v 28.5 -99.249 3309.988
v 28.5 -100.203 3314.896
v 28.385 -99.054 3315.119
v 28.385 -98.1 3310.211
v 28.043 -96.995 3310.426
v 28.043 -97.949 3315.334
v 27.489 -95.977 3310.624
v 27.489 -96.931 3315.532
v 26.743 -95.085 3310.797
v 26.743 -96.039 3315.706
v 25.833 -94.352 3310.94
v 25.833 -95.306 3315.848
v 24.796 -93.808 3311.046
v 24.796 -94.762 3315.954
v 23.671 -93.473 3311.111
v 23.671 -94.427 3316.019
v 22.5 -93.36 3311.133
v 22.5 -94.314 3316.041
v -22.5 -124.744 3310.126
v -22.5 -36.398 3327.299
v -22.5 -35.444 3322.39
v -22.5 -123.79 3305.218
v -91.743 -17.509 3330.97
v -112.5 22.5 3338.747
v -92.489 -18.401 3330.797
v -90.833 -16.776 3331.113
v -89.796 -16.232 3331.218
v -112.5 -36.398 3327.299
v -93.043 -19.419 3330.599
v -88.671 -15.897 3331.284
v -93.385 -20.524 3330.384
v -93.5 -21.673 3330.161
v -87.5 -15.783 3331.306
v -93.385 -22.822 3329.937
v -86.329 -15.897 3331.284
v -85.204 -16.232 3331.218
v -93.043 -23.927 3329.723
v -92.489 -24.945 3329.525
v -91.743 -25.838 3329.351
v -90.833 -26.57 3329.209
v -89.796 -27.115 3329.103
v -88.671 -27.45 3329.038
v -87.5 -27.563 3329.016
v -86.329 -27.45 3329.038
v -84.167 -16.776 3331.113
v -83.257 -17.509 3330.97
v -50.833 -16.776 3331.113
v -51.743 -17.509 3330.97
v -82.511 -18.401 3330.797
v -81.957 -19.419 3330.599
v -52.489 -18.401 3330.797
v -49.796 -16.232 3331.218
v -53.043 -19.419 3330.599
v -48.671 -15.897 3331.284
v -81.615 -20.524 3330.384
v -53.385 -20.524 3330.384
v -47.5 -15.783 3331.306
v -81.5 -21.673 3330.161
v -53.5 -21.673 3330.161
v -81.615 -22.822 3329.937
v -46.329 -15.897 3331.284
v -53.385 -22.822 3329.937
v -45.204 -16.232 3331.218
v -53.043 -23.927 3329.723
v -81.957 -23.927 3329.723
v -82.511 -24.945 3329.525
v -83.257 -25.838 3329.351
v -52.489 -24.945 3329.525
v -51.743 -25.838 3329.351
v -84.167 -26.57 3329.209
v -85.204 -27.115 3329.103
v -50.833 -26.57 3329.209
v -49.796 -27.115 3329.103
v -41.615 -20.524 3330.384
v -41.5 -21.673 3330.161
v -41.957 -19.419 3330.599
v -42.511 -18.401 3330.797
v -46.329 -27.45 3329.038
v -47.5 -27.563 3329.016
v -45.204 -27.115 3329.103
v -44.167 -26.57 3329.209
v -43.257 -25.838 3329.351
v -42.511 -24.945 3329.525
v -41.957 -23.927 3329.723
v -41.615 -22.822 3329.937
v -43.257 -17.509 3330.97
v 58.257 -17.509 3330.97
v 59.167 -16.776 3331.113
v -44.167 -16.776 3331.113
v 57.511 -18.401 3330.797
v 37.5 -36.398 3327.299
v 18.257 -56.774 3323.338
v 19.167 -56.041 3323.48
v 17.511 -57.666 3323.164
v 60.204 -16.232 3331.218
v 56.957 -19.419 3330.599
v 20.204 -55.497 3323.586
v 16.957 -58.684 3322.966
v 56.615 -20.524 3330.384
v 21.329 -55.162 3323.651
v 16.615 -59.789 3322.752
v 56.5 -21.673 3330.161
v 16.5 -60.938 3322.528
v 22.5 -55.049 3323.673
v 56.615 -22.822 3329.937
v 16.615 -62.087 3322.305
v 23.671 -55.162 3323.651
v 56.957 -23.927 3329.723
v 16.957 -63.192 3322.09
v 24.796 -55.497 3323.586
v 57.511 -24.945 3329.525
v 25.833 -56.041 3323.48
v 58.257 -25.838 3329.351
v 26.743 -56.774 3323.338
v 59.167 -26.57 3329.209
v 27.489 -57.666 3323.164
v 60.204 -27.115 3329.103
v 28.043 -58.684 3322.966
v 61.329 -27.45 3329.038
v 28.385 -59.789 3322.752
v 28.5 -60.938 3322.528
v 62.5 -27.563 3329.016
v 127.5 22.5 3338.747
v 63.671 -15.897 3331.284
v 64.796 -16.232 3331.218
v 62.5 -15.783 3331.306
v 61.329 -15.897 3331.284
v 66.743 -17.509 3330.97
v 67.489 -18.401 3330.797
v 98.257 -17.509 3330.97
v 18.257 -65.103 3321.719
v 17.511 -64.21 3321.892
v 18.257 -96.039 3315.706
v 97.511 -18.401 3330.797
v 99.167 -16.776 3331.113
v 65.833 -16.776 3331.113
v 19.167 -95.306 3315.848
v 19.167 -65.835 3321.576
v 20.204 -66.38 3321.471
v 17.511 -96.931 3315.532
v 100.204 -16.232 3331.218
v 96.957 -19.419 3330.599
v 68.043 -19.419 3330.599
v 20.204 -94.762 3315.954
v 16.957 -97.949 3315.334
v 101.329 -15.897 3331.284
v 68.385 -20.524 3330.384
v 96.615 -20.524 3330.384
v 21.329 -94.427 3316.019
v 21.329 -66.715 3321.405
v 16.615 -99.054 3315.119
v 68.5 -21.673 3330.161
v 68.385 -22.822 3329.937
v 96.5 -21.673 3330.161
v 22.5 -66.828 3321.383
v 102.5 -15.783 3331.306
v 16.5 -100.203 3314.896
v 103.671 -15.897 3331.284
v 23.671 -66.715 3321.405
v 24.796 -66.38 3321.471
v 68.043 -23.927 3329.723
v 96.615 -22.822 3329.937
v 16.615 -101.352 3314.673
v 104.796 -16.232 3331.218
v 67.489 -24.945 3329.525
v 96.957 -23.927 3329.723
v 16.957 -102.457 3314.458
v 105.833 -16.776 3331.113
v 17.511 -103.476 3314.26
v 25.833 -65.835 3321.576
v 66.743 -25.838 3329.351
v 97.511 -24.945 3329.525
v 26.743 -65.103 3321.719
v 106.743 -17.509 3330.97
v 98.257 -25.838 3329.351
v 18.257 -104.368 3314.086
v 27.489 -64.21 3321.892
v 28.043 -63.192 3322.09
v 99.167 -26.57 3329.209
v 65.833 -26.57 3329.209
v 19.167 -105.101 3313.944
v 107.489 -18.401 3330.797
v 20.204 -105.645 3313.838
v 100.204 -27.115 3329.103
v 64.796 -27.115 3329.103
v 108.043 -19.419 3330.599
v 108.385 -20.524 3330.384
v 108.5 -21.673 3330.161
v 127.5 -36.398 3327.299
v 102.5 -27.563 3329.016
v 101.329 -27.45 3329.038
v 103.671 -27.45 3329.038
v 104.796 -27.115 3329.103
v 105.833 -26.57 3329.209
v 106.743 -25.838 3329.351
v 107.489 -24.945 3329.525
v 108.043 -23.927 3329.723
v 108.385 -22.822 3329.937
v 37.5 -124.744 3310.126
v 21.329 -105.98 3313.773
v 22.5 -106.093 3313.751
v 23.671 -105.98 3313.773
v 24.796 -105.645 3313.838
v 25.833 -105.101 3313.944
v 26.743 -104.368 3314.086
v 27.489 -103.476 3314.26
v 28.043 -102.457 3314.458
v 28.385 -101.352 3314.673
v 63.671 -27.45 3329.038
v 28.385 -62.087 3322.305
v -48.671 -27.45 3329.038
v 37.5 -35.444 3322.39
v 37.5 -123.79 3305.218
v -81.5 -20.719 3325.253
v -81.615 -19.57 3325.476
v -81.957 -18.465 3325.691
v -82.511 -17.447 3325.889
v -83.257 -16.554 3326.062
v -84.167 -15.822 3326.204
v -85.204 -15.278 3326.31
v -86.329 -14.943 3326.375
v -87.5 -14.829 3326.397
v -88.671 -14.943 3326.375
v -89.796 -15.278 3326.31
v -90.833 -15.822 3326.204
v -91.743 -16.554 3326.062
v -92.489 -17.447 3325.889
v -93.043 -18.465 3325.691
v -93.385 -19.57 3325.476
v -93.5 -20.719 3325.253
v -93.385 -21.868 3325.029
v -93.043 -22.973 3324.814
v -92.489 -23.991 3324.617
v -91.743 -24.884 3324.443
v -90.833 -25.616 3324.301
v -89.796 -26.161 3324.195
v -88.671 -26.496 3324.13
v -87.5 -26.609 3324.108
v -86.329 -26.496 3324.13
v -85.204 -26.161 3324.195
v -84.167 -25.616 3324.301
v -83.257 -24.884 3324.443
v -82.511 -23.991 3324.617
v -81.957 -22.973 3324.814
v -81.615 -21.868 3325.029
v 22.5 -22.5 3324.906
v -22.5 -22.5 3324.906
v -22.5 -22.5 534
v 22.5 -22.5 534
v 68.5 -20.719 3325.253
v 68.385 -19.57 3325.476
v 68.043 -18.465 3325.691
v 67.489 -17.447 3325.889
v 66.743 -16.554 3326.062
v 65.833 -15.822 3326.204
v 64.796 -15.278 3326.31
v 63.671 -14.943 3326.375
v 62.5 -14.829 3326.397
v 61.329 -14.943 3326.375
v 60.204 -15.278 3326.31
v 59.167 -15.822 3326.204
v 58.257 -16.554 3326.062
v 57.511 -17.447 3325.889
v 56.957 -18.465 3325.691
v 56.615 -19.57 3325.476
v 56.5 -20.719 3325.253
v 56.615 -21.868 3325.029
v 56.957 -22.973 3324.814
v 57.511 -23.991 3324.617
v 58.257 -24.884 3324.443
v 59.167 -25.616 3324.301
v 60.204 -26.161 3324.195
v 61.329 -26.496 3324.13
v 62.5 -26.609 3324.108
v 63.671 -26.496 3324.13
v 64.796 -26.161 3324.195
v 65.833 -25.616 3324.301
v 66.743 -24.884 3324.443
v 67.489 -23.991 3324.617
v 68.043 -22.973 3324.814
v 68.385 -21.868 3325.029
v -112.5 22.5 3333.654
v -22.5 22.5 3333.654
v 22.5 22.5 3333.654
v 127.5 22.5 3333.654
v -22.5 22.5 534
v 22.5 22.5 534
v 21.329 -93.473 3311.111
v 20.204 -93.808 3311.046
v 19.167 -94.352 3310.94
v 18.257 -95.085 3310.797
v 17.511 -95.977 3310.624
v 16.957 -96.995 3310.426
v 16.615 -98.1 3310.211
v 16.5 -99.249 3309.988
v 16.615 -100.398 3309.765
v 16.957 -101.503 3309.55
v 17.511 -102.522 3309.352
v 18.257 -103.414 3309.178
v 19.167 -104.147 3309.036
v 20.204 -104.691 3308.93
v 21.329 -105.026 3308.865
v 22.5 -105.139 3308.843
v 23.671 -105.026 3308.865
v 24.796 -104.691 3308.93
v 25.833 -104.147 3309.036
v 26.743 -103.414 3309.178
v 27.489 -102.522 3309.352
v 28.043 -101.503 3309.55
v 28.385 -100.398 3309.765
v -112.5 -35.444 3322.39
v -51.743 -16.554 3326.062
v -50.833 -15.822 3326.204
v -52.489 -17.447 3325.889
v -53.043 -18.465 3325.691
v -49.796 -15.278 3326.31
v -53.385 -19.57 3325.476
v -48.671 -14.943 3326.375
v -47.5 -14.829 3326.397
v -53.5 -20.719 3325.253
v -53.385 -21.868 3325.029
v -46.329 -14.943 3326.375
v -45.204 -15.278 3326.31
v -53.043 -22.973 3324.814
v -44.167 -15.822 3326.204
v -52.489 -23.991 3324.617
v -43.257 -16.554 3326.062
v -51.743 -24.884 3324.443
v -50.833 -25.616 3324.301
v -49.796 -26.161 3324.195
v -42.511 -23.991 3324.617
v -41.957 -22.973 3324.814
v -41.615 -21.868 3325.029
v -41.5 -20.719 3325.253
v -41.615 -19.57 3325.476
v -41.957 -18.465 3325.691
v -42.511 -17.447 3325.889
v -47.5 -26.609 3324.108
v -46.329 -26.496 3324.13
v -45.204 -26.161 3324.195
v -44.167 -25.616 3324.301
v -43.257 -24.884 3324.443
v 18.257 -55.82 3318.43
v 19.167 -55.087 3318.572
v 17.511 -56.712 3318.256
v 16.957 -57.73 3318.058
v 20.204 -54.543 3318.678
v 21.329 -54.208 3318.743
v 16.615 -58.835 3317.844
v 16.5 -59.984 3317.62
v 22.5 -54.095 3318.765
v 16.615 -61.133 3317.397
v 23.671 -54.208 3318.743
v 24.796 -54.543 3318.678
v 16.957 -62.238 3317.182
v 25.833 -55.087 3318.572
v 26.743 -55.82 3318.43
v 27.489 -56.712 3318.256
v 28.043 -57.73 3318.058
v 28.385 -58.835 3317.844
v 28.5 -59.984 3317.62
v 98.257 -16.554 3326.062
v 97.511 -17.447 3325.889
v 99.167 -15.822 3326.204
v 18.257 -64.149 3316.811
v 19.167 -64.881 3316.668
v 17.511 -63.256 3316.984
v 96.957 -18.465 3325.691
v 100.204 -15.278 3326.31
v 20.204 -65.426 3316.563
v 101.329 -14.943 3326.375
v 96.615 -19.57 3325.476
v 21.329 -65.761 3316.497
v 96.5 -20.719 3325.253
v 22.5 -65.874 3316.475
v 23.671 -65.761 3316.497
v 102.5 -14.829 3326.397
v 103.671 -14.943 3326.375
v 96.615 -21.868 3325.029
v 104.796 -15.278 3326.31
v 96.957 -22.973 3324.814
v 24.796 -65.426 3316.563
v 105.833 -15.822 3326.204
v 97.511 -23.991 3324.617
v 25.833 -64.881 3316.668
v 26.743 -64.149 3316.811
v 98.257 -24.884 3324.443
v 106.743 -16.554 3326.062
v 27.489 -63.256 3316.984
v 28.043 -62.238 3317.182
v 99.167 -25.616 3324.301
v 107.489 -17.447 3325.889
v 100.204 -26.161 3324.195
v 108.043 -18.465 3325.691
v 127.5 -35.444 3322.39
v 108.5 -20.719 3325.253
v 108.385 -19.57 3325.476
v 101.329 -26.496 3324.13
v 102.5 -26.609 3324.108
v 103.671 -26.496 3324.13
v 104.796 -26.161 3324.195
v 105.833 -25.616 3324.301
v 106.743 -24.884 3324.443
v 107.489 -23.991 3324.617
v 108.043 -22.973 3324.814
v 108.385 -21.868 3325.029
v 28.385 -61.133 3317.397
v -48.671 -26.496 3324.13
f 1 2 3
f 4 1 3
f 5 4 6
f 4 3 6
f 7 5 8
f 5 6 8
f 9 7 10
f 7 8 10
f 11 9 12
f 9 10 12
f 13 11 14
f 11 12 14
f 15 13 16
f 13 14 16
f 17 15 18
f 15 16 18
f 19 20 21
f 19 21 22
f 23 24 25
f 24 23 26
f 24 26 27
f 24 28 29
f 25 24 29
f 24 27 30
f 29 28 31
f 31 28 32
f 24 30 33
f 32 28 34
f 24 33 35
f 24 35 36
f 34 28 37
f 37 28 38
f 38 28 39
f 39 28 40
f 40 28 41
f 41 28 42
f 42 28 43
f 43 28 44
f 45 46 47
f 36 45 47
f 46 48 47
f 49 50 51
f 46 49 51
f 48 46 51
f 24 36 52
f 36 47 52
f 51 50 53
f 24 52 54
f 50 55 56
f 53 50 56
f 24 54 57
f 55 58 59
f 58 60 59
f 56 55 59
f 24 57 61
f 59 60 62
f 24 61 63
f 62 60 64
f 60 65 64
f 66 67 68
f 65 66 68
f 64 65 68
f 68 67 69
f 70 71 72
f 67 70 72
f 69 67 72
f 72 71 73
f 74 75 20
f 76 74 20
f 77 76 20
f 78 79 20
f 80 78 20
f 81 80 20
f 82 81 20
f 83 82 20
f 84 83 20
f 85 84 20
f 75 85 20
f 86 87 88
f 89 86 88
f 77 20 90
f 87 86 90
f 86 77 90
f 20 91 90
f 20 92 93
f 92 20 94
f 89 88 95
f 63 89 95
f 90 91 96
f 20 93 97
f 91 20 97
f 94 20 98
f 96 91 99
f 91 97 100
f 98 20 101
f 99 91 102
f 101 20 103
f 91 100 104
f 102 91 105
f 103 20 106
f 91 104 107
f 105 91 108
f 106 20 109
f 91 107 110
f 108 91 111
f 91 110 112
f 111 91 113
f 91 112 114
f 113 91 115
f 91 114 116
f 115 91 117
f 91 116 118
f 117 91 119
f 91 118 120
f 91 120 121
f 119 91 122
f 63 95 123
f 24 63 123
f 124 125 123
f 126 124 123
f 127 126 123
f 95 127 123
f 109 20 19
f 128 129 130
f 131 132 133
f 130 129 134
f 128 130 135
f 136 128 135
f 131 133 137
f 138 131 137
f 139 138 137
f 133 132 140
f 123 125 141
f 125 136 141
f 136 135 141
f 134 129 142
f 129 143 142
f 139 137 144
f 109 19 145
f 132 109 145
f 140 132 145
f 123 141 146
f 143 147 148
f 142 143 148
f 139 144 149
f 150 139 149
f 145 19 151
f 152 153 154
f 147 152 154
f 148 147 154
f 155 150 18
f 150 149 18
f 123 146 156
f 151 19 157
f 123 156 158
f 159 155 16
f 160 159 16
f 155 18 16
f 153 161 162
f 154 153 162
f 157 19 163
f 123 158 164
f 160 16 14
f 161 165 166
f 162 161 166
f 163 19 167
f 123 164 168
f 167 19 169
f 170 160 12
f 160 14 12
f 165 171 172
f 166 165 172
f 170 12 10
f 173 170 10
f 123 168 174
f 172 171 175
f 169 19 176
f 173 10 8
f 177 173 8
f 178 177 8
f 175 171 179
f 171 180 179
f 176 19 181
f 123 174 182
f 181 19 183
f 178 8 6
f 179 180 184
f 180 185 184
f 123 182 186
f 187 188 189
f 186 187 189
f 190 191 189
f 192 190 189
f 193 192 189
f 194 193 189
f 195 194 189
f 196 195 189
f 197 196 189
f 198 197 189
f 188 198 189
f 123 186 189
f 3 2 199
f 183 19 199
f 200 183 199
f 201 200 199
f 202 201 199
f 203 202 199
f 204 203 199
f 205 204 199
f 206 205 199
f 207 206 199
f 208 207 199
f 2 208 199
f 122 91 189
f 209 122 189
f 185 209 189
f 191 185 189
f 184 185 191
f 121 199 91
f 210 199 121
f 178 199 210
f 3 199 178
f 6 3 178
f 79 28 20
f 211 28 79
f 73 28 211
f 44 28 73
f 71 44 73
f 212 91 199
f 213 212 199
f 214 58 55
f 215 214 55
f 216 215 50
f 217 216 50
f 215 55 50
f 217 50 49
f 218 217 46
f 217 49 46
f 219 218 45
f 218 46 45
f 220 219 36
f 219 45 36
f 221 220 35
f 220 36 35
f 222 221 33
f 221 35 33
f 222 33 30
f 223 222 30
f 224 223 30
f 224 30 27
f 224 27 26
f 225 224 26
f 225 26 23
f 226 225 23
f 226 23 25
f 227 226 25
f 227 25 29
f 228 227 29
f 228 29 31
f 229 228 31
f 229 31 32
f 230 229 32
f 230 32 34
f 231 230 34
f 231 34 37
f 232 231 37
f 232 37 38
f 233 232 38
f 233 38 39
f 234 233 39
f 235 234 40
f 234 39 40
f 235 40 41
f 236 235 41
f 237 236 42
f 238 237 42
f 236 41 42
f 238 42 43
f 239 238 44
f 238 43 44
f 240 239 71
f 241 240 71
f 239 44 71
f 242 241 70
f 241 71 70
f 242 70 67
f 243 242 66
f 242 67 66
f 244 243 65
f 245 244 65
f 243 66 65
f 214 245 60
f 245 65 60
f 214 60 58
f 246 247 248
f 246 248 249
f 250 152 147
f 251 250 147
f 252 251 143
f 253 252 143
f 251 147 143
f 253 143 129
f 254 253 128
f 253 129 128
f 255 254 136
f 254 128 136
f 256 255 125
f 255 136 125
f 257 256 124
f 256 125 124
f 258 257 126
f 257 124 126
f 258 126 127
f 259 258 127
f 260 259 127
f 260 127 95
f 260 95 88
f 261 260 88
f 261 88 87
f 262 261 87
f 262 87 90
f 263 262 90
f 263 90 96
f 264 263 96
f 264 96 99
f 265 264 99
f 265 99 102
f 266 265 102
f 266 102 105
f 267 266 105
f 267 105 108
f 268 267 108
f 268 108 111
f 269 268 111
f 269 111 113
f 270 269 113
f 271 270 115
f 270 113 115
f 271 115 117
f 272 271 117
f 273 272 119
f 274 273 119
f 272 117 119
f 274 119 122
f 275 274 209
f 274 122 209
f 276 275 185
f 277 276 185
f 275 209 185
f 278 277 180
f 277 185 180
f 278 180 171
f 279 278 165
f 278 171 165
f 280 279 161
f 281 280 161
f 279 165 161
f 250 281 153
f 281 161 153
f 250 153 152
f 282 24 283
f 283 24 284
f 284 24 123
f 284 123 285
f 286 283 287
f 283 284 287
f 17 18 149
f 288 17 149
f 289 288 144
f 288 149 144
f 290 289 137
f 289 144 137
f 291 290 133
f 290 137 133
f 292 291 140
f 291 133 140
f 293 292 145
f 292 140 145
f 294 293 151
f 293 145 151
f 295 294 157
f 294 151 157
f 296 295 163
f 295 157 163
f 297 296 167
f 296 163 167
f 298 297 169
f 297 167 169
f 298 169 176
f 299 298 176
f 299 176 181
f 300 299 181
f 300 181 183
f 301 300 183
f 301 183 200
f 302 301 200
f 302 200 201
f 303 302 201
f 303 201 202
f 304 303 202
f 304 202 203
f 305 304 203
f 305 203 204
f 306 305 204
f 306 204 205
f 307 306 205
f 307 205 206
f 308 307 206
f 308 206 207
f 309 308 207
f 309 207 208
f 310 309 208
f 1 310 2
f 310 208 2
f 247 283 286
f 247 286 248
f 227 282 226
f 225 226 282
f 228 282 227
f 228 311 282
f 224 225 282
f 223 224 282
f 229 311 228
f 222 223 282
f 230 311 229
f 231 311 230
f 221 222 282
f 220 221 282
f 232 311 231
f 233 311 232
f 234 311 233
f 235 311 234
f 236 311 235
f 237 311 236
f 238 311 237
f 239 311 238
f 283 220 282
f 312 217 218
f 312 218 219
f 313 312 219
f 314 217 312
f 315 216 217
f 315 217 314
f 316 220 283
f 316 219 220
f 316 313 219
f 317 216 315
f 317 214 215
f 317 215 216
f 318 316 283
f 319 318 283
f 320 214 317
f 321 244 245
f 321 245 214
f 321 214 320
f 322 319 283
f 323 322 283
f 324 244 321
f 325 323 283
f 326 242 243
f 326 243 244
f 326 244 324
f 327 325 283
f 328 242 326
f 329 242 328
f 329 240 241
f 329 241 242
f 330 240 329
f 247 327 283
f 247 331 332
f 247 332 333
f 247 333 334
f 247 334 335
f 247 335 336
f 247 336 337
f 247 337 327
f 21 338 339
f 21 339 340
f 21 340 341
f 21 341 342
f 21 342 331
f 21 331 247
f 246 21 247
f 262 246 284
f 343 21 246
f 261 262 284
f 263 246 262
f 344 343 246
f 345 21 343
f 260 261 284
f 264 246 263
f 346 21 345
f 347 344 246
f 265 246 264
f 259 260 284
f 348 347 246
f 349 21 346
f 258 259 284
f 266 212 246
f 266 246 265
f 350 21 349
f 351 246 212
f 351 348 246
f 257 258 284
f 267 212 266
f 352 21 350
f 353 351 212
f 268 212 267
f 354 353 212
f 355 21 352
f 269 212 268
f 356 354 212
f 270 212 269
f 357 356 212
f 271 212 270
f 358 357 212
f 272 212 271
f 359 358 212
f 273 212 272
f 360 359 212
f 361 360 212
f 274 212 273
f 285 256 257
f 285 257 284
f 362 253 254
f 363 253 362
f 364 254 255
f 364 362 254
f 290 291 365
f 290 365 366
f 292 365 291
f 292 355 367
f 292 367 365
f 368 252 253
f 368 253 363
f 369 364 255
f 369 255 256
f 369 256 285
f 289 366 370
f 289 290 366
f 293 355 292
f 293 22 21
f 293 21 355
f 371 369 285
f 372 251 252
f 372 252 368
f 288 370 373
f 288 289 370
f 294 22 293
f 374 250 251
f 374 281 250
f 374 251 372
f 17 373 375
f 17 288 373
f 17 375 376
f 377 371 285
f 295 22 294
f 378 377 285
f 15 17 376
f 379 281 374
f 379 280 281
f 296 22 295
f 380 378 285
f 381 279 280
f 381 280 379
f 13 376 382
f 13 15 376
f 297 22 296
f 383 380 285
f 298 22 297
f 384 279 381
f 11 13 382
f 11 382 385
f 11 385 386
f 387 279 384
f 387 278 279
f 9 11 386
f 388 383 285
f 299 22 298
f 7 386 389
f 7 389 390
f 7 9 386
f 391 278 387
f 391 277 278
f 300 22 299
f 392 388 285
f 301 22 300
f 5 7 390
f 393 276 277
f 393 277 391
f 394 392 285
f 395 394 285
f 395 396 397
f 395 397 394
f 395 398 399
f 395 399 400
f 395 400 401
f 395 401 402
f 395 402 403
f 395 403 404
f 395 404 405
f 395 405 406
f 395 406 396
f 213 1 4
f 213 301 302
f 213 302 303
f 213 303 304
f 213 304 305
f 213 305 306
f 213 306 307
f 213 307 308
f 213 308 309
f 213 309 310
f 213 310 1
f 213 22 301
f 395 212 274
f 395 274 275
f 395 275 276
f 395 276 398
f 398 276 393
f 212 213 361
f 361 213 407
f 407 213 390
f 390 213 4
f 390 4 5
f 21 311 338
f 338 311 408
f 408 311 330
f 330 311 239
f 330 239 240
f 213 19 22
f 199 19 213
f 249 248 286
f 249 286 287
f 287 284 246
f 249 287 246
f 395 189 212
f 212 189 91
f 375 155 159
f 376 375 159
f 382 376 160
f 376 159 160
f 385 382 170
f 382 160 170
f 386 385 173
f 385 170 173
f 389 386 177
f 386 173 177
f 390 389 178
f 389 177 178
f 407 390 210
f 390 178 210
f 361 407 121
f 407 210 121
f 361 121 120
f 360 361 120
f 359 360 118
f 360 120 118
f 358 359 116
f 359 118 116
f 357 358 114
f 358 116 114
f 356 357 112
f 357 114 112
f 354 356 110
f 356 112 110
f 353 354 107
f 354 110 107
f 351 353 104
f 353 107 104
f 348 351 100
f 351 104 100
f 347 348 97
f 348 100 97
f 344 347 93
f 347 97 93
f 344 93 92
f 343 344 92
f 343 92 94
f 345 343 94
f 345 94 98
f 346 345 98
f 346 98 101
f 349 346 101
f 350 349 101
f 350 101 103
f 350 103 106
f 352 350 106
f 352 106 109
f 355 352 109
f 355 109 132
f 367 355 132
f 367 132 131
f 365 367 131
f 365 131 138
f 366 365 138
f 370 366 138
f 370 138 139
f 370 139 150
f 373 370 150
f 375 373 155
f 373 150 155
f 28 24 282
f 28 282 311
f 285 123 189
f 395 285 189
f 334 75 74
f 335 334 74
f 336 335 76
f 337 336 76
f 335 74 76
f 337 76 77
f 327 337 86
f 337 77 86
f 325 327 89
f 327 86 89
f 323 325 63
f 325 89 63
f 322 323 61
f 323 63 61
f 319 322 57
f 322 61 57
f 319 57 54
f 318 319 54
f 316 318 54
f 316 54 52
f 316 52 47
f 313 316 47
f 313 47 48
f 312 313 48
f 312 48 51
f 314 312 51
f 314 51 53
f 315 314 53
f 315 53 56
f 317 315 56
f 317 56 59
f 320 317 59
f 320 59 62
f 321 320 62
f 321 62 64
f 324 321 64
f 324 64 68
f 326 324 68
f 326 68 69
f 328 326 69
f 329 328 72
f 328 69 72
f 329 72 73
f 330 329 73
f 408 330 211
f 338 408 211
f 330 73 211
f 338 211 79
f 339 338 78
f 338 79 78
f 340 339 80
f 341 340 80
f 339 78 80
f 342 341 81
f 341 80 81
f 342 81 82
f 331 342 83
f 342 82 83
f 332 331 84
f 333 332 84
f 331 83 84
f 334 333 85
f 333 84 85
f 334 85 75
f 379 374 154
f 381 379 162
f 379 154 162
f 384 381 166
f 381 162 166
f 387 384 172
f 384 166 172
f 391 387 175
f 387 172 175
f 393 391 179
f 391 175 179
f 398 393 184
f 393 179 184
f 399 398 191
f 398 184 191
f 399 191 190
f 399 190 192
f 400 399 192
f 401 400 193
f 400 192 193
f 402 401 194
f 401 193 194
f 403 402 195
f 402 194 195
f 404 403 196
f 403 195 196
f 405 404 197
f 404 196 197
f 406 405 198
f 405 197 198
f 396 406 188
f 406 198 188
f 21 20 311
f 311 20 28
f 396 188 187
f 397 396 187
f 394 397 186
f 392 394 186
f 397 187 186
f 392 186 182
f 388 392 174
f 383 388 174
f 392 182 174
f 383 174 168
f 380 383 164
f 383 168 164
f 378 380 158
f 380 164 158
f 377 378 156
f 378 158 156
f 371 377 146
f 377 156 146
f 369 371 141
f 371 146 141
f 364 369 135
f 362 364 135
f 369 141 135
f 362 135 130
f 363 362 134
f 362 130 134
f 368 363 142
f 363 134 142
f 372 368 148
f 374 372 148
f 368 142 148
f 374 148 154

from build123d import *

# Parameters (mm, degrees)
F0_W      = 45
F0_H      = 45
F1_DEPTH  = 3330
F6_W      = 45
F6_H      = 45.842251273
F7_DEPTH  = 25
F8_W      = 60
F8_H      = 60
F8_W_2    = 90
F8_H_2    = 90
F9_DEPTH  = 5
F10_R     = 6
F11_DEPTH = 25
F12_W     = 150
F12_H     = 4.7702248844
F13_DEPTH = 3358.6871623993
F15_DEPTH = 111
F16_W     = 45
F16_H     = 45
F17_DEPTH = 534


with BuildPart() as f1:
    # F0 (on Top) → F1 (new body)
    with BuildSketch(Plane.XY):
        Rectangle(F0_W, F0_H)
    extrude(amount=F1_DEPTH)

    # F6 (on face) → F7 (join)
    with BuildSketch(Plane(origin=(0, -624.5391596736, 3212.9754420296), x_dir=(1, 0, 0), z_dir=(0, 0.1908089954, -0.9816271834))):
        with Locations((0, -636.2284686128)):
            Rectangle(F6_W, F6_H)
    extrude(amount=F7_DEPTH)

    # F8 (on face) → F9 (join)
    with BuildSketch(Plane(origin=(0, -624.5391596736, 3212.9754420296), x_dir=(1, 0, 0), z_dir=(0, 0.1908089954, -0.9816271834))):
        with Locations((7.5, -629.1495942493)):
            Rectangle(F8_W, F8_H)
        with Locations((-67.5, -629.1495942493)):
            Rectangle(F8_W_2, F8_H)
        with Locations((82.5, -629.1495942493)):
            Rectangle(F8_W_2, F8_H)
        with Locations((7.5, -554.1495942493)):
            Rectangle(F8_W, F8_H_2)
    extrude(amount=F9_DEPTH)

    # F10 (on face) → F11 (cut)
    with BuildSketch(Plane(origin=(0, -624.5391596736, 3212.9754420296), x_dir=(1, 0, 0), z_dir=(0, -0.1908089954, 0.9816271834))):
        with BuildLine():
            ThreePointArc((22.5, 540.1495942493), (18.2573593129, 529.9069535622), (28.5, 534.1495942493))
            Line((28.5, 534.1495942493), (22.5, 534.1495942493))
            Line((22.5, 534.1495942493), (22.5, 540.1495942493))
        make_face()
        with BuildLine():
            Line((22.5, 534.1495942493), (28.5, 534.1495942493))
            ThreePointArc((28.5, 534.1495942493), (26.7426406871, 538.3922349364), (22.5, 540.1495942493))
            Line((22.5, 540.1495942493), (22.5, 534.1495942493))
        make_face()
        with BuildLine():
            ThreePointArc((28.5, 574.1495942493), (18.2573593129, 578.3922349364), (22.5, 568.1495942493))
            ThreePointArc((22.5, 568.1495942493), (26.7426406871, 569.9069535622), (28.5, 574.1495942493))
        make_face()
        with BuildLine():
            ThreePointArc((96.5, 614.1495942493), (98.2573593129, 609.9069535622), (102.5, 608.1495942493))
            Line((102.5, 608.1495942493), (102.5, 614.1495942493))
            Line((102.5, 614.1495942493), (96.5, 614.1495942493))
        make_face()
        with Locations((62.5, 614.1495942493)):
            Circle(F10_R)
        with BuildLine():
            Line((102.5, 614.1495942493), (102.5, 608.1495942493))
            ThreePointArc((102.5, 608.1495942493), (106.7426406871, 609.9069535622), (108.5, 614.1495942493))
            ThreePointArc((108.5, 614.1495942493), (102.5, 620.1495942493), (96.5, 614.1495942493))
            Line((96.5, 614.1495942493), (102.5, 614.1495942493))
        make_face()
        with Locations((-47.5, 614.1495942493)):
            Circle(F10_R)
        with Locations((-87.5, 614.1495942493)):
            Circle(F10_R)
    extrude(amount=-F11_DEPTH, mode=Mode.SUBTRACT)

    # F12 (on Top) → F13 (cut)
    with BuildSketch(Plane.XY):
        with Locations((52.5, 24.8851124422)):
            Rectangle(F12_W, F12_H)
    extrude(amount=F13_DEPTH, mode=Mode.SUBTRACT)

    # F14 (on face) → F15 (cut)
    with BuildSketch(Plane.YZ.offset(-22.5)):
        Polygon((22.5, 3333.6535304364), (23.4540449769, 3333.838977994), (22.5, 3338.7471139112), align=None)
    extrude(amount=-F15_DEPTH, mode=Mode.SUBTRACT)

    # F16 (on face) → F17 (cut)
    with BuildSketch(Plane(origin=(0, 0, 0), x_dir=(1, 0, 0), z_dir=(0, 0, -1))):
        Rectangle(F16_W, F16_H)
    extrude(amount=-F17_DEPTH, mode=Mode.SUBTRACT)


solid = f1.part
